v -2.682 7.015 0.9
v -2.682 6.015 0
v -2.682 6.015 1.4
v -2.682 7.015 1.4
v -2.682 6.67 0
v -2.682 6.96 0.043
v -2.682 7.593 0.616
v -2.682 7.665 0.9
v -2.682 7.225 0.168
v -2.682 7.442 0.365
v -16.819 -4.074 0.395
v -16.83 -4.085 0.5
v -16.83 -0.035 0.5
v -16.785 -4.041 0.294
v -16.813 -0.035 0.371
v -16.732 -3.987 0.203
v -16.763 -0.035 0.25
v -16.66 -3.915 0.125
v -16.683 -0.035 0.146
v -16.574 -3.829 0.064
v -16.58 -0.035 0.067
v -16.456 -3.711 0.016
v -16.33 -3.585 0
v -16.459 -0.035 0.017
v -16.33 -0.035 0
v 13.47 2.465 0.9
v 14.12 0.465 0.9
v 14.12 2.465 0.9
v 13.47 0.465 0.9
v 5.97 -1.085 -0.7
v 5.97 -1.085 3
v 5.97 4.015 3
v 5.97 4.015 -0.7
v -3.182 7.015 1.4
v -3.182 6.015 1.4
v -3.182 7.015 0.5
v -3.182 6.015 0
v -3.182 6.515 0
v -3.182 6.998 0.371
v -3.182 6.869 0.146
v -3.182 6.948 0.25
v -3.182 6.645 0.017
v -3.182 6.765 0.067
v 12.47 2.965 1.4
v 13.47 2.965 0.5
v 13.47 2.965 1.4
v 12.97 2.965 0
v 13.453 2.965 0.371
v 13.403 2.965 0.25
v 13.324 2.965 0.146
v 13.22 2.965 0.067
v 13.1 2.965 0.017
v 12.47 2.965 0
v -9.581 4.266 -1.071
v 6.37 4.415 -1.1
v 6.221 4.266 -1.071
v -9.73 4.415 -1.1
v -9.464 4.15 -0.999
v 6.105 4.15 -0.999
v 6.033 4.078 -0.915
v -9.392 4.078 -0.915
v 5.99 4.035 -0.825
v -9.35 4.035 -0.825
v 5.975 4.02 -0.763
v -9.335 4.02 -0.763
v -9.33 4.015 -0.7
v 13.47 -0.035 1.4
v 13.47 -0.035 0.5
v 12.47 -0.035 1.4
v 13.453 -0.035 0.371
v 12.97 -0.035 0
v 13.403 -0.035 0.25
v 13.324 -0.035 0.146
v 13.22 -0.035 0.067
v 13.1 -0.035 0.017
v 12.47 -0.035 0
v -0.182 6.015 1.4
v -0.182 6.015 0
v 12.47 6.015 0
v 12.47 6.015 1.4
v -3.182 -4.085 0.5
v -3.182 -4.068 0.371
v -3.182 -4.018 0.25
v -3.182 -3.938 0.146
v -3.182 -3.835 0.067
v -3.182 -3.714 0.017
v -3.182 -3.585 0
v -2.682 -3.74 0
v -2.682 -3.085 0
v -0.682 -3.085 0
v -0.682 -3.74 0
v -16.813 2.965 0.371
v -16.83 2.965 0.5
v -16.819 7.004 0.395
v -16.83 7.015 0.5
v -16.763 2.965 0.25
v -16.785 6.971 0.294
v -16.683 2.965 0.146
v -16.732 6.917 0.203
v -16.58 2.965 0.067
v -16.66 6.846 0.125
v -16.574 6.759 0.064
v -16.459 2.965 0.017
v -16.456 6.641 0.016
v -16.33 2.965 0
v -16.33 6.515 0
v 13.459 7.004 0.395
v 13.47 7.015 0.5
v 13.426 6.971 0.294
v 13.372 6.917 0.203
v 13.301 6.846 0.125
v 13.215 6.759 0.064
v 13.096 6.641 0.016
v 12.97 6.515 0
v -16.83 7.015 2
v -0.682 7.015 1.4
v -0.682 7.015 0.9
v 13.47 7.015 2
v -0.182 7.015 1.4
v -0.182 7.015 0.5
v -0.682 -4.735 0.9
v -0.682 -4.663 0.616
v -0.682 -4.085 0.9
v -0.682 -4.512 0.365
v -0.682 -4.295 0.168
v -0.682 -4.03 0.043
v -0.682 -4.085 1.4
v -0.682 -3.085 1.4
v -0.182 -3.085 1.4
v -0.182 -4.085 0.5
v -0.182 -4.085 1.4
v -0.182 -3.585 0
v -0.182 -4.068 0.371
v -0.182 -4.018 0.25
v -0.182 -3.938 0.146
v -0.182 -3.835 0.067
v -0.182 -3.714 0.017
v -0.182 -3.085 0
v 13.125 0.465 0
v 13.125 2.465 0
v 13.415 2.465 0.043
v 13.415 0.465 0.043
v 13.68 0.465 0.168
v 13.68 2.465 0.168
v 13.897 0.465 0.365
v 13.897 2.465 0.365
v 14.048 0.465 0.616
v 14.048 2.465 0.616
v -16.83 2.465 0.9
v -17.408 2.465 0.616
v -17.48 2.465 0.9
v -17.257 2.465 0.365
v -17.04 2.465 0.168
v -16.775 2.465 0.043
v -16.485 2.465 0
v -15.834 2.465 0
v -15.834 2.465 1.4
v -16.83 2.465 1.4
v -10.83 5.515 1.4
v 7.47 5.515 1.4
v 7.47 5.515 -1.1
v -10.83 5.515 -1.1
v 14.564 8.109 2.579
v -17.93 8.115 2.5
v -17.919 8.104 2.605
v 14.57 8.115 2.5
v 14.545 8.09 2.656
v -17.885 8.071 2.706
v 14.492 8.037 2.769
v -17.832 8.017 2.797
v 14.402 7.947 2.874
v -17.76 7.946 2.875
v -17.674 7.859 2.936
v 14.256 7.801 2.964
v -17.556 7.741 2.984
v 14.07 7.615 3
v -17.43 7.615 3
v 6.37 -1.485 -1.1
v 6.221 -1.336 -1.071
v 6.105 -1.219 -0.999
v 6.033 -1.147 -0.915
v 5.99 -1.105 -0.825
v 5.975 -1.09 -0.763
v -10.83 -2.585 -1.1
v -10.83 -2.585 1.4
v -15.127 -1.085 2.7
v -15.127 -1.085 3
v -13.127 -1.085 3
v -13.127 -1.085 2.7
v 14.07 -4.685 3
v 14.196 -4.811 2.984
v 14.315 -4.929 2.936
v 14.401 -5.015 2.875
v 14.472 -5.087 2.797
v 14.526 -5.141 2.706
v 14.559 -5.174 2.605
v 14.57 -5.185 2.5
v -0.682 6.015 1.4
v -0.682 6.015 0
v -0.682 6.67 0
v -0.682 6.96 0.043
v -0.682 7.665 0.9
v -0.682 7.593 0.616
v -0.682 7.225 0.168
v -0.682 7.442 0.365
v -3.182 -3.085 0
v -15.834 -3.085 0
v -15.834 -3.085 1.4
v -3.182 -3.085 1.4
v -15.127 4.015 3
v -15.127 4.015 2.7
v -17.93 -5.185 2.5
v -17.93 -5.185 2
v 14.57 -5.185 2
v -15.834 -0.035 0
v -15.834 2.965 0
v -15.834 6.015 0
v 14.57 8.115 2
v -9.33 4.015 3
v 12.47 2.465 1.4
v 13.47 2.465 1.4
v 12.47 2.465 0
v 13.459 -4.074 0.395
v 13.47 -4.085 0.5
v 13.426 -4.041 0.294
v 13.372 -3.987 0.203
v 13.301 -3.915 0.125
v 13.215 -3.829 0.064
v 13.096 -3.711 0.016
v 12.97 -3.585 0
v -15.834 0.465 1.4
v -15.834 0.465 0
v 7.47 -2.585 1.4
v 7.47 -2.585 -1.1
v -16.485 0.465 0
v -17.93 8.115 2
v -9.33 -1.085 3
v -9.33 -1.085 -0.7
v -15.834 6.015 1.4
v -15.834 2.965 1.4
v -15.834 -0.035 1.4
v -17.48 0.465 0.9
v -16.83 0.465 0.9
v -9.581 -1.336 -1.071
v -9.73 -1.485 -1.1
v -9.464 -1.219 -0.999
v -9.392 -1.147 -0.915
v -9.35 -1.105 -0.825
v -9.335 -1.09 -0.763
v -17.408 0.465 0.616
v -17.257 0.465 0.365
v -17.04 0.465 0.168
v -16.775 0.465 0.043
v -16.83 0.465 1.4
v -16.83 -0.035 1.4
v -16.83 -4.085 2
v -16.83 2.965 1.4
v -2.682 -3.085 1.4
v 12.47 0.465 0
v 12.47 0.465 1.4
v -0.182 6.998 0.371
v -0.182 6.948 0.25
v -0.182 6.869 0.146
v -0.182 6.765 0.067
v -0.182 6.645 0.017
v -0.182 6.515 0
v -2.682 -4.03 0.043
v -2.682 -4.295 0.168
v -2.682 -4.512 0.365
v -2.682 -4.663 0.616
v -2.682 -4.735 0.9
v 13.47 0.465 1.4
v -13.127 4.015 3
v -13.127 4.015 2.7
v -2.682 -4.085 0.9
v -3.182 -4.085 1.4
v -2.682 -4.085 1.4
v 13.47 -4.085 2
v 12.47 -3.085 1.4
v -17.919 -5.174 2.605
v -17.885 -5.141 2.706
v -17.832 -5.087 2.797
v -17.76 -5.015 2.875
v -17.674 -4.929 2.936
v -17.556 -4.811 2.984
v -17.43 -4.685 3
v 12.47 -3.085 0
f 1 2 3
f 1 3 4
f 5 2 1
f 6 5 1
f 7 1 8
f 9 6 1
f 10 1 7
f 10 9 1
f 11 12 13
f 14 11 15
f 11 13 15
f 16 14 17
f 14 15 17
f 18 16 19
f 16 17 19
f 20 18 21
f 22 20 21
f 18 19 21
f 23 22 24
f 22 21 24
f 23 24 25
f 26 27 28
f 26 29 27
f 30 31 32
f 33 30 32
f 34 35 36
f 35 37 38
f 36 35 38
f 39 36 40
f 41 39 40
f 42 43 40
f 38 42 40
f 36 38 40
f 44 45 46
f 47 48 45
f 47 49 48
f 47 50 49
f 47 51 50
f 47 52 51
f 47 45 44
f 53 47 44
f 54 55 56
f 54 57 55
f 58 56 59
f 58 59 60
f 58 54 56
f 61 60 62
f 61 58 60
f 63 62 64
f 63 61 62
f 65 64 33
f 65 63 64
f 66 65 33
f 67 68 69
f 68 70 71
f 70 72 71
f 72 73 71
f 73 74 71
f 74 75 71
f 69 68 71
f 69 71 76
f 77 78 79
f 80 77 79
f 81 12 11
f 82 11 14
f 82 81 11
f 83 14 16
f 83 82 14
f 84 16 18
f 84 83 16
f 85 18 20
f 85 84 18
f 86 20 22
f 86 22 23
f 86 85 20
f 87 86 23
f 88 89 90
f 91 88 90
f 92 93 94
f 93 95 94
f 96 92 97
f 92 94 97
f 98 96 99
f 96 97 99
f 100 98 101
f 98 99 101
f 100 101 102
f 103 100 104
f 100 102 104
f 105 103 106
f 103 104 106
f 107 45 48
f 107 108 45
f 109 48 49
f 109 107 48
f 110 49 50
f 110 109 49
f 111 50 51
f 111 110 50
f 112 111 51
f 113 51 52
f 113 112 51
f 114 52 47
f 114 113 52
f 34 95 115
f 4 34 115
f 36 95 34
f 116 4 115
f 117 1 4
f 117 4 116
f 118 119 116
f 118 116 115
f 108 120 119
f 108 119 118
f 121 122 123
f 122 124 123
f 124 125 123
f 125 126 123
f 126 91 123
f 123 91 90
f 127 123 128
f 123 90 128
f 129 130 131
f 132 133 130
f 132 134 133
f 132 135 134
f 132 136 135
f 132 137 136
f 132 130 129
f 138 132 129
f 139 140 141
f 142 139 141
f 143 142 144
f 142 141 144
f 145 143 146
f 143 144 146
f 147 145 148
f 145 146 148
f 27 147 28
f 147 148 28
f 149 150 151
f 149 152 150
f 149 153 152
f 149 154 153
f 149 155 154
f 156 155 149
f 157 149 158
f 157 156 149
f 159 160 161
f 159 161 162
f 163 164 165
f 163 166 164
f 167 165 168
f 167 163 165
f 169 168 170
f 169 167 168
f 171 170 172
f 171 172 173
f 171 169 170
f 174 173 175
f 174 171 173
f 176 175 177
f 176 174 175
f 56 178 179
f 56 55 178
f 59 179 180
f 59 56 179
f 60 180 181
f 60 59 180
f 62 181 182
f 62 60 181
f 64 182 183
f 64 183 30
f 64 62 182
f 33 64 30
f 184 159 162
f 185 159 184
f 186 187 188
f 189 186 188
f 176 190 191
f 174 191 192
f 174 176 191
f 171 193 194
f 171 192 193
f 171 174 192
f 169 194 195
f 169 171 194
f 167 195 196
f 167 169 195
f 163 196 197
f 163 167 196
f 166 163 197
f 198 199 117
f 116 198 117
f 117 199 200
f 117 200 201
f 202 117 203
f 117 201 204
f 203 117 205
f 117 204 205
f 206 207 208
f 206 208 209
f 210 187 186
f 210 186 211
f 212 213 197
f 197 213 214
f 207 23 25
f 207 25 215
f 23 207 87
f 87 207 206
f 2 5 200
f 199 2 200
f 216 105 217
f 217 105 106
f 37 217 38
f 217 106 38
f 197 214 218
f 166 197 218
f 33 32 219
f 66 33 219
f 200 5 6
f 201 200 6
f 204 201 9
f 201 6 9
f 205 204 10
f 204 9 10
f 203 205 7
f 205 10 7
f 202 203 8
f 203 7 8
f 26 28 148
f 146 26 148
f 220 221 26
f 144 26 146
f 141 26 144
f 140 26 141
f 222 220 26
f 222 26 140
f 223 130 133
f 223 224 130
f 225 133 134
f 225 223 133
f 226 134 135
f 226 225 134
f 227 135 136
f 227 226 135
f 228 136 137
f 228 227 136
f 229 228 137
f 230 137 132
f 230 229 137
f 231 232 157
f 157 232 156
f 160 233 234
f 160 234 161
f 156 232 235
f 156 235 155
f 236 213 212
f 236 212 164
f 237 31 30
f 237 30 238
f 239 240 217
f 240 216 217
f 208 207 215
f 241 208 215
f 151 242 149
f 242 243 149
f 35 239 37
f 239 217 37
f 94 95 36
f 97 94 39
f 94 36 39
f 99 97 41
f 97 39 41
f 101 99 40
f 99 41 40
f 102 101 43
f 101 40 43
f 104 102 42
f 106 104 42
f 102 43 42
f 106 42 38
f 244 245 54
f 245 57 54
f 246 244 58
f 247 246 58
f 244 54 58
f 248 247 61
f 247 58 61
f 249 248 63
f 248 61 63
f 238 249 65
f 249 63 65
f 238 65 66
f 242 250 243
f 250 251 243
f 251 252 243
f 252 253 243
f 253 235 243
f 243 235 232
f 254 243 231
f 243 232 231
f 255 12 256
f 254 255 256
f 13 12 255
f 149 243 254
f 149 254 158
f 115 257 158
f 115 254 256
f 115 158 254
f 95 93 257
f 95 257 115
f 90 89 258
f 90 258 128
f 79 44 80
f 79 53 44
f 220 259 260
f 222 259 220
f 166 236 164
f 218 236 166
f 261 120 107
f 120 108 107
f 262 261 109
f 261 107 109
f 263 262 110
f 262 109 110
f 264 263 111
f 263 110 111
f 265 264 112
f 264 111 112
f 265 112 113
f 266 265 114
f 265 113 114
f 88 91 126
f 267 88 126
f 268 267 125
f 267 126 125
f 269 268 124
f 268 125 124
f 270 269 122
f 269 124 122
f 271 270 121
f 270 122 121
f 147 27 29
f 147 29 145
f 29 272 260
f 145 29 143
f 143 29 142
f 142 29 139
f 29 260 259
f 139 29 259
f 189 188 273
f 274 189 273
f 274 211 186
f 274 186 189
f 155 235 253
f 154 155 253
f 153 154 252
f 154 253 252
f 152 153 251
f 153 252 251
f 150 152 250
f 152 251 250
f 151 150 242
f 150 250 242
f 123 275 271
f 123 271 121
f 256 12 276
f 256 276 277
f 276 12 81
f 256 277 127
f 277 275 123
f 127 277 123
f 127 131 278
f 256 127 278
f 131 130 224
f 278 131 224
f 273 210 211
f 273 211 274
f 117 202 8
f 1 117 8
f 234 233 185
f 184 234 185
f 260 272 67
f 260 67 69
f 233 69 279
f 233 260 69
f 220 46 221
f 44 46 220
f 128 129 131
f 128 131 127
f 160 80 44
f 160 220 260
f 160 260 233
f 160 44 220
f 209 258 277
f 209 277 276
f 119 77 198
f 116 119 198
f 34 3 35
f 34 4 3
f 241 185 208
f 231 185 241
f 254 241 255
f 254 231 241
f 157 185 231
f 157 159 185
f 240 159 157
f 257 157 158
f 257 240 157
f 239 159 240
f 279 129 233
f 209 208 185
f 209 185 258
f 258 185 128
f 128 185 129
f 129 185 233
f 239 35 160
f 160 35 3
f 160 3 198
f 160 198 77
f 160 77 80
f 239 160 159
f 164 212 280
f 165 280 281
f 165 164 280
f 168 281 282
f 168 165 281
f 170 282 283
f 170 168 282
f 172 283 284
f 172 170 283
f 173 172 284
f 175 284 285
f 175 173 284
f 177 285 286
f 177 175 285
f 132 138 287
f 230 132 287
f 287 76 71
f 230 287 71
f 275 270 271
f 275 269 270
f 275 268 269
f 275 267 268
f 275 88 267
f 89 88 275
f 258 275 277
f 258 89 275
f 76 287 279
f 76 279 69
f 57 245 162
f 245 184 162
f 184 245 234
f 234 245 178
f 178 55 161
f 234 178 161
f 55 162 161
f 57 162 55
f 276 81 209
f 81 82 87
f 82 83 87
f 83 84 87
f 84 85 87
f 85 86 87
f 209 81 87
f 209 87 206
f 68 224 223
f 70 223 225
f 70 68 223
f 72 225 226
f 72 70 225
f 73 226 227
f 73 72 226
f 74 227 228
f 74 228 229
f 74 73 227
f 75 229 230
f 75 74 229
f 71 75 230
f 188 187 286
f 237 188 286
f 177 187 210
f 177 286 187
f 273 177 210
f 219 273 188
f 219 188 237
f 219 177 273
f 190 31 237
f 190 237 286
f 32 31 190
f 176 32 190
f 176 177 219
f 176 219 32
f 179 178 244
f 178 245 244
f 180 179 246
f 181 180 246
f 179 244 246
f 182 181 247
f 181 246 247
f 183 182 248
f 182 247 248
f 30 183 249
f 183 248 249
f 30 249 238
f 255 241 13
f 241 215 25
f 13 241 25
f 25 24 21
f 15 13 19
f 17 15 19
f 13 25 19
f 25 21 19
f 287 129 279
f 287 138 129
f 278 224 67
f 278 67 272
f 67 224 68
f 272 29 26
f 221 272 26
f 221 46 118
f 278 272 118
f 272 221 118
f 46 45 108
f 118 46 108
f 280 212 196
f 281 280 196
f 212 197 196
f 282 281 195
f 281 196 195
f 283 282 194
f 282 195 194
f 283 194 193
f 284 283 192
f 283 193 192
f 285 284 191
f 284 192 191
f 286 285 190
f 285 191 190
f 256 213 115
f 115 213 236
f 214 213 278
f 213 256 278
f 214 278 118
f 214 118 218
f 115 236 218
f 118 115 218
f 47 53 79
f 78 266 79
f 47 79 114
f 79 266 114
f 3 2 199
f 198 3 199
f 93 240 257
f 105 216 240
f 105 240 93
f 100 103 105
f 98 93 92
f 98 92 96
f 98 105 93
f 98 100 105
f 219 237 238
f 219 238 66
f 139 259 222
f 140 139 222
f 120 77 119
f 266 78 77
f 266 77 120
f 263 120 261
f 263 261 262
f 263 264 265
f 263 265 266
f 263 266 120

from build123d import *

# Parameters (mm, degrees)
SZKIC1_W                    = 30.3
SZKIC1_H                    = 11.1
SZKIC1_W_2                  = 28.304453741
SZKIC1_H_2                  = 9.1
DODANIE_WYCI_GNI_CIE1_DEPTH = 2
SZKIC2_W                    = 32.5
SZKIC2_H                    = 13.3
DODANIE_WYCI_GNI_CIE2_DEPTH = 1
ZAOKR_GLENIE1_R             = 0.5
SZKIC3_W                    = 1.095546259
SZKIC3_H                    = 0.5
SZKIC3_W_2                  = 1.2
SZKIC3_W_3                  = 0.5
SZKIC3_H_2                  = 1.2
SZKIC3_H_3                  = 1.1
WYTNIJ_WYCI_GNI_CIE1_DEPTH  = 1.4
ZAOKR_GLENIE2_R             = 0.5
SZKIC4_W                    = 2
SZKIC4_H                    = 1.15
SZKIC4_W_2                  = 1.145546259
SZKIC4_H_2                  = 2
SZKIC4_W_3                  = 1.15
DODANIE_WYCI_GNI_CIE3_DEPTH = 0.9
SZKIC5_W                    = 0.9
SZKIC5_H                    = 2
DODANIE_WYCI_GNI_CIE4_DEPTH = 0.5
SZKIC6_W                    = 2
SZKIC6_H                    = 0.9
DODANIE_WYCI_GNI_CIE5_DEPTH = 0.5
SZKIC7_W                    = 0.9
SZKIC7_H                    = 2
DODANIE_WYCI_GNI_CIE6_DEPTH = 0.5
ZAOKR_GLENIE5_R             = 1
SZKIC8_W                    = 28.304453741
SZKIC8_H                    = 9.1
DODANIE_WYCI_GNI_CIE7_DEPTH = 0.6
SZKIC9_W                    = 15.3
SZKIC9_H                    = 5.1
WYTNIJ_WYCI_GNI_CIE2_DEPTH  = 1.6
SZKIC10_W                   = 15.3
SZKIC10_H                   = 5.1
DODANIE_WYCI_GNI_CIE8_DEPTH = 2.5
ZAOKR_GLENIE6_R             = 0.4
SZKIC11_W                   = 2
SZKIC11_H                   = 5.1
WYTNIJ_WYCI_GNI_CIE3_DEPTH  = 0.3


with BuildPart() as part:
    # Szkic1 → Dodanie-wyciągnięcie1 (new body)
    with BuildSketch(Plane.XY):
        with Locations((-1.679789747, 1.465189223)):
            Rectangle(SZKIC1_W, SZKIC1_H)
        with Locations((-1.682016617, 1.465189223)):
            Rectangle(SZKIC1_W_2, SZKIC1_H_2, mode=Mode.SUBTRACT)
    extrude(amount=DODANIE_WYCI_GNI_CIE1_DEPTH)

    # Szkic2 → Dodanie-wyciągnięcie2 (add)
    with BuildSketch(Plane.XY.offset(2)):
        with Locations((-1.679789747, 1.465189223)):
            Rectangle(SZKIC2_W, SZKIC2_H)
    extrude(amount=DODANIE_WYCI_GNI_CIE2_DEPTH)

    # Zaokrąglenie1
    zaokr_glenie1_edges = [part.edges().sort_by_distance(p)[0] for p in [
        (-17.929789747, 1.465189223, 3),
        (-1.679789747, -5.184810777, 3),
        (14.570210253, 1.465189223, 3),
        (-1.679789747, 8.115189223, 3),
    ]]
    fillet(zaokr_glenie1_edges, radius=ZAOKR_GLENIE1_R)

    # Szkic3 → Wytnij-wyciągnięcie1 (cut)
    with BuildSketch(Plane(origin=(0, 0, 0), x_dir=(-1, 0, 0), z_dir=(0, 0, -1))):
        with Locations((16.382016617, 2.715189223)):
            Rectangle(SZKIC3_W, SZKIC3_H)
        with Locations((-13.070210253, 0.215189223)):
            Rectangle(SZKIC3_W_2, SZKIC3_H)
        with Locations((2.932016617, 6.615189223)):
            Rectangle(SZKIC3_W_3, SZKIC3_H_2)
        with Locations((0.432016617, 6.615189223)):
            Rectangle(SZKIC3_W_3, SZKIC3_H_2)
        with Locations((-13.070210253, 2.715189223)):
            Rectangle(SZKIC3_W_2, SZKIC3_H)
        with Locations((2.932016617, -3.634810777)):
            Rectangle(SZKIC3_W_3, SZKIC3_H_3)
        with Locations((0.432016617, -3.634810777)):
            Rectangle(SZKIC3_W_3, SZKIC3_H_3)
        with Locations((16.382016617, 0.215189223)):
            Rectangle(SZKIC3_W, SZKIC3_H)
    extrude(amount=-WYTNIJ_WYCI_GNI_CIE1_DEPTH, mode=Mode.SUBTRACT)

    # Zaokrąglenie2
    zaokr_glenie2_edges = [part.edges().sort_by_distance(p)[0] for p in [
        (6.644096818, 7.015189223, 0),
        (13.470210253, -2.059810777, 0),
        (-10.005903182, -4.084810777, 0),
        (-16.829789747, 4.990189223, 0),
        (-10.005903182, 7.015189223, 0),
        (13.470210253, 4.990189223, 0),
        (6.644096818, -4.084810777, 0),
        (-16.829789747, -2.059810777, 0),
    ]]
    fillet(zaokr_glenie2_edges, radius=ZAOKR_GLENIE2_R)

    # Szkic4 → Dodanie-wyciągnięcie3 (add)
    with BuildSketch(Plane(origin=(0, 0, 0), x_dir=(-1, 0, 0), z_dir=(0, 0, -1))):
        Polygon((0.682016617, 6.015189223), (2.682016617, 6.015189223), (2.682016617, 7.165189223), (2.682016617, 7.665189223), (0.682016617, 7.665189223), (0.682016617, 7.165189223), align=None)
        with Locations((1.682016617, -3.659810777)):
            Rectangle(SZKIC4_W, SZKIC4_H)
        with Locations((16.407016618, 1.465189223)):
            Rectangle(SZKIC4_W_2, SZKIC4_H_2)
        with Locations((-13.045210253, 1.465189223)):
            Rectangle(SZKIC4_W_3, SZKIC4_H_2)
    extrude(amount=-DODANIE_WYCI_GNI_CIE3_DEPTH)

    # Szkic5 → Dodanie-wyciągnięcie4 (add)
    with BuildSketch(Plane(origin=(13.620210253, 0, 0), x_dir=(0, 0, -1), z_dir=(1, 0, 0))):
        with Locations((-0.45, 1.465189223)):
            Rectangle(SZKIC5_W, SZKIC5_H)
    extrude(amount=DODANIE_WYCI_GNI_CIE4_DEPTH)

    # Szkic6 → Dodanie-wyciągnięcie5 (add)
    with BuildSketch(Plane.XZ.offset(4.234810777)):
        with Locations((-1.682016617, 0.45)):
            Rectangle(SZKIC6_W, SZKIC6_H)
    extrude(amount=DODANIE_WYCI_GNI_CIE5_DEPTH)

    # Szkic7 → Dodanie-wyciągnięcie6 (add)
    with BuildSketch(Plane.ZY.offset(16.979789747)):
        with Locations((0.45, 1.465189223)):
            Rectangle(SZKIC7_W, SZKIC7_H)
    extrude(amount=DODANIE_WYCI_GNI_CIE6_DEPTH)

    # Zaokrąglenie5
    # the kernel refuses this fillet: 1 mm, written as the material it takes off along each edge
    with BuildSketch(Plane(origin=(-5.16948521, 7.665189223, 0), x_dir=(0, -1, 0), z_dir=(1, 0, 0))) as zaokr_glenie5_piece_1:
        with BuildLine():
            CenterArc((0.994987437, -1), ZAOKR_GLENIE5_R, 90, 84.260829523)
            Line((0, -0.9), (-0.019899749, -0.898))
            ThreePointArc((-0.019899749, -0.898), (-0.02, -0.45), (-0.02, 0))
            Line((-0.02, 0), (0, 0.02))
            Line((0, 0.02), (0.994987437, 0.02))
            Line((0.994987437, 0.02), (0.994987437, 0))
        make_face()
    extrude(amount=6.974937186, mode=Mode.SUBTRACT)
    with BuildSketch(Plane(origin=(14.120210253, 4.952657816, 0), x_dir=(0, 0, 1), z_dir=(0, -1, 0)), Plane(origin=(1.805451975, -4.734810777, 0), x_dir=(0, 0, 1), z_dir=(-1, 0, 0)), Plane(origin=(-17.479789747, -2.02227937, 0), x_dir=(0, 0, 1), z_dir=(0, 1, 0))) as zaokr_glenie5_piece_2:
        with BuildLine():
            CenterArc((1, 0.994987437), ZAOKR_GLENIE5_R, 180, 84.260829523)
            Line((0, 0.994987437), (-0.02, 0.994987437))
            Line((-0.02, 0.994987437), (-0.02, 0))
            Line((-0.02, 0), (0, -0.02))
            ThreePointArc((0, -0.02), (0.45, -0.02), (0.898, -0.019899749))
            Line((0.898, -0.019899749), (0.9, 0))
        make_face()
    extrude(amount=6.974937186, mode=Mode.SUBTRACT)

    # Szkic8 → Dodanie-wyciągnięcie7 (add)
    with BuildSketch(Plane(origin=(0, 0, 2), x_dir=(-1, 0, 0), z_dir=(0, 0, -1))):
        with Locations((1.682016617, 1.465189223)):
            Rectangle(SZKIC8_W, SZKIC8_H)
    extrude(amount=DODANIE_WYCI_GNI_CIE7_DEPTH)

    # Szkic9 → Wytnij-wyciągnięcie2 (cut)
    with BuildSketch(Plane.XY.offset(3)):
        with Locations((-1.679789747, 1.465189223)):
            Rectangle(SZKIC9_W, SZKIC9_H)
    extrude(amount=-WYTNIJ_WYCI_GNI_CIE2_DEPTH, mode=Mode.SUBTRACT)

    # Szkic10 → Dodanie-wyciągnięcie8 (add)
    with BuildSketch(Plane(origin=(0, 0, 1.4), x_dir=(-1, 0, 0), z_dir=(0, 0, -1))):
        Polygon((-7.470210253, 5.515189223), (10.829789747, 5.515189223), (10.829789747, -2.584810777), (9.329789747, -2.584810777), (-5.970210253, -2.584810777), (-7.470210253, -2.584810777), align=None)
        with Locations((1.679789747, 1.465189223)):
            Rectangle(SZKIC10_W, SZKIC10_H, mode=Mode.SUBTRACT)
    extrude(amount=DODANIE_WYCI_GNI_CIE8_DEPTH)

    # Zaokrąglenie6
    zaokr_glenie6_edges = [part.edges().sort_by_distance(p)[0] for p in [
        (5.970210253, 1.465189223, -1.1),
        (-1.679789747, -1.084810777, -1.1),
        (-9.329789747, 1.465189223, -1.1),
        (-1.679789747, 4.015189223, -1.1),
    ]]
    fillet(zaokr_glenie6_edges, radius=ZAOKR_GLENIE6_R)

    # Szkic11 → Wytnij-wyciągnięcie3 (cut)
    with BuildSketch(Plane.XY.offset(3)):
        with Locations((-14.12705039, 1.465189223)):
            Rectangle(SZKIC11_W, SZKIC11_H)
    extrude(amount=-WYTNIJ_WYCI_GNI_CIE3_DEPTH, mode=Mode.SUBTRACT)


solid = part.part
